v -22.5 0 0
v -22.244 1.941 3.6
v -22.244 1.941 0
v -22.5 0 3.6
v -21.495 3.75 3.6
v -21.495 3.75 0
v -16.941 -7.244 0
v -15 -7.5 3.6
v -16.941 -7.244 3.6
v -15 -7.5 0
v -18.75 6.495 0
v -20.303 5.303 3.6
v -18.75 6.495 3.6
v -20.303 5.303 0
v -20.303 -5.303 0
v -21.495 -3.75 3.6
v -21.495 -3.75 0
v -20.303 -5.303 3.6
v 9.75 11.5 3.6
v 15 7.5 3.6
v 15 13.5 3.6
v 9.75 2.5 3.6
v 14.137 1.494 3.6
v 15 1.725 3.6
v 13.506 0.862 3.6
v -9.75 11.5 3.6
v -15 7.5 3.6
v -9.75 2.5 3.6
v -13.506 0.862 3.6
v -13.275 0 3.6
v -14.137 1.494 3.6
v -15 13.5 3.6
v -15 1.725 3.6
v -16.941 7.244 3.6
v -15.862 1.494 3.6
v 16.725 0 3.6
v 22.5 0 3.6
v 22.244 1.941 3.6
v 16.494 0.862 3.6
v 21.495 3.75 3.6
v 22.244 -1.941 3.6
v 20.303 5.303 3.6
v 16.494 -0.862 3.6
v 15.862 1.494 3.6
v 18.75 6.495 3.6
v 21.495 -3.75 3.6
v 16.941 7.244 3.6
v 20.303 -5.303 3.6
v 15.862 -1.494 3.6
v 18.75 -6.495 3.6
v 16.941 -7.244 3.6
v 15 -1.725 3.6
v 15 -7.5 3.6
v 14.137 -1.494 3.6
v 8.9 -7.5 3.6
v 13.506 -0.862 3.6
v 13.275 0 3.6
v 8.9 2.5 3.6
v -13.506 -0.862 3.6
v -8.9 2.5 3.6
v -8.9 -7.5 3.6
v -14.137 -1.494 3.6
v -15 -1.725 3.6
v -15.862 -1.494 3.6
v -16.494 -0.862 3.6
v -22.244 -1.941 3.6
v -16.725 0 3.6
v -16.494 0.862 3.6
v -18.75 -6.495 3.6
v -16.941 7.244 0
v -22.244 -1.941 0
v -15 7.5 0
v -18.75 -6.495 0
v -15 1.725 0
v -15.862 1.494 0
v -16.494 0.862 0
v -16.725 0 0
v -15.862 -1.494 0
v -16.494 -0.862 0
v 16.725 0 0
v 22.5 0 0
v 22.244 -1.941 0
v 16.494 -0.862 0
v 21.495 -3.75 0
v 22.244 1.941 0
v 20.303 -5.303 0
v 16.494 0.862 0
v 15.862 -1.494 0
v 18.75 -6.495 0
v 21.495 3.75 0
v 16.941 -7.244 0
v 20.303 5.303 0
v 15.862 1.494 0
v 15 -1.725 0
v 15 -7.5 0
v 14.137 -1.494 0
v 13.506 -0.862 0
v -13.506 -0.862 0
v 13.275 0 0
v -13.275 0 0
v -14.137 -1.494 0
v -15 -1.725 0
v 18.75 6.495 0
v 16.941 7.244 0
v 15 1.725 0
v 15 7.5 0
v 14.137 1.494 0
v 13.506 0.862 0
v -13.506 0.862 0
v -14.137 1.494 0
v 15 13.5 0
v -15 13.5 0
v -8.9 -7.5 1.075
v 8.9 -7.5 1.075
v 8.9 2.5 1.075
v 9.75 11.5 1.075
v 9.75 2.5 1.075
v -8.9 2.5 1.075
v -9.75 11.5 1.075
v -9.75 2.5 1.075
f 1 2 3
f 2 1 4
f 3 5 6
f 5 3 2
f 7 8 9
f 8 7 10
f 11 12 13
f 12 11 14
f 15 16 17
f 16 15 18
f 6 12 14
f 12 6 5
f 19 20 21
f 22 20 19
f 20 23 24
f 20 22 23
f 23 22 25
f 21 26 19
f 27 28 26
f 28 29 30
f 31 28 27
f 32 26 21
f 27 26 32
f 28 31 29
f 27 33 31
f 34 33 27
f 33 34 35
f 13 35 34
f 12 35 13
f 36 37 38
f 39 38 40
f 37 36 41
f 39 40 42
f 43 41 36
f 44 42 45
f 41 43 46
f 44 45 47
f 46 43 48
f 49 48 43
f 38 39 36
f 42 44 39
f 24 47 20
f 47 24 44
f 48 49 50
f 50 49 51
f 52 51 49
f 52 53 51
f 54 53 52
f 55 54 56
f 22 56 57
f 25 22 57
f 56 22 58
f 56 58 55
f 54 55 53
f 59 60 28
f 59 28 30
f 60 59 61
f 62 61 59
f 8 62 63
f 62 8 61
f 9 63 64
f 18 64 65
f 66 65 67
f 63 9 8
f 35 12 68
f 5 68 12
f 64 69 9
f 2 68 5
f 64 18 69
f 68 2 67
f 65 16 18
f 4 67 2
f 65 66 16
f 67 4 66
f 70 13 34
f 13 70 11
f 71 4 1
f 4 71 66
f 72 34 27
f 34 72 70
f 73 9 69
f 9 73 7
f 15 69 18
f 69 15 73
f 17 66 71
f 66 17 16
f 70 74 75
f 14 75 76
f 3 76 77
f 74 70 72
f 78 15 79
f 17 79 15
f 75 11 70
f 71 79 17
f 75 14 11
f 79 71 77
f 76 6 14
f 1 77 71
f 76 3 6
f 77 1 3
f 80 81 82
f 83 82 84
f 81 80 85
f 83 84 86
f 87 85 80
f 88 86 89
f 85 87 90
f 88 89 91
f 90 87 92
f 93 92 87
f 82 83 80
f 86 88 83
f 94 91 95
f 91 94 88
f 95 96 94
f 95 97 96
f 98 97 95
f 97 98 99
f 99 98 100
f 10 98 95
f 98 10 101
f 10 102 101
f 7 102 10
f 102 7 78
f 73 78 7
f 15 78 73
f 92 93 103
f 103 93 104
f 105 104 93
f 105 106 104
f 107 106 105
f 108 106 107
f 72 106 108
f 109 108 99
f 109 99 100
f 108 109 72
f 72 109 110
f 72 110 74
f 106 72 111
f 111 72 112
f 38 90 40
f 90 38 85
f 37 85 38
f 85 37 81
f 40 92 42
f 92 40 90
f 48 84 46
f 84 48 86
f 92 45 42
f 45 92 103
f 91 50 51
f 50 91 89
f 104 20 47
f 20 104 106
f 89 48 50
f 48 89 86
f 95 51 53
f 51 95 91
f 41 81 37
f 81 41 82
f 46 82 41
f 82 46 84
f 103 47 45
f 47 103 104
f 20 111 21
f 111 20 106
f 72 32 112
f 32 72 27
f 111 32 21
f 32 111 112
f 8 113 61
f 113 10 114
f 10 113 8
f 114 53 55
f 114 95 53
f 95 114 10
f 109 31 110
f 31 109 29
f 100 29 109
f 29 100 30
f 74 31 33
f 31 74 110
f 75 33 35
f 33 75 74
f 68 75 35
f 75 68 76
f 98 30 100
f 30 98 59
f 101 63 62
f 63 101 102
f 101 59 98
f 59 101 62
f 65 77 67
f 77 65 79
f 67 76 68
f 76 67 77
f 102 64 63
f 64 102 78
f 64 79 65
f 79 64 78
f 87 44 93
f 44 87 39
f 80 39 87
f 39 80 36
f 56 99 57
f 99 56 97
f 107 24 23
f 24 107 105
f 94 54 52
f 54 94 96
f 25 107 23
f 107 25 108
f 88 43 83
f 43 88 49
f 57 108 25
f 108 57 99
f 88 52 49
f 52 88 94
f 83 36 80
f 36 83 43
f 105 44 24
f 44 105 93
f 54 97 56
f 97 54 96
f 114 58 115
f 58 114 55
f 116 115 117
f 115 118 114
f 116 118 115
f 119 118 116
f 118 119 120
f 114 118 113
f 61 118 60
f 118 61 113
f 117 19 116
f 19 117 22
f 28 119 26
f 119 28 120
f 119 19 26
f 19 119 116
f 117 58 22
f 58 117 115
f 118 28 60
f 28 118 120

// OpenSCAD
// file: configuration.scad
// Increase this if your slicer or printer make holes too tight.
extra_radius = 0.1;

// OD = outside diameter, corner to corner.
m3_nut_od = 6.1;
m3_nut_radius = m3_nut_od/2 + 0.2 + extra_radius;
m3_washer_radius = 3.5 + extra_radius;

// Major diameter of metric 3mm thread.
m3_major = 2.85;
m3_radius = m3_major/2 + extra_radius;
m3_wide_radius = m3_major/2 + extra_radius + 0.2;

// NEMA17 stepper motors.
motor_shaft_diameter = 5;
motor_shaft_radius = motor_shaft_diameter/2 + extra_radius;

// Frame brackets. M3x8mm screws work best with 3.6 mm brackets.
thickness = 3.6;

// OpenBeam or Misumi. Currently only 15x15 mm, but there is a plan
// to make models more parametric and allow 20x20 mm in the future.
extrusion = 15;

// Placement for the NEMA17 stepper motors.
motor_offset = 44;
motor_length = 47;
// main file
include <configuration.scad>;

radius = 7.5;

difference() {
  union() {
    for (x = [-2*radius, 2*radius]) {
      translate([x, 0, thickness/2])
        cylinder(r=radius, h=thickness, center=true, $fn=24);
    }
    translate([0, 3, thickness/2])
      cube([4*radius, 2*radius+6, thickness], center=true);
  }
  for (x = [-2*radius, 2*radius]) {
    translate([x, 0, 0]) #
      cylinder(r=m3_wide_radius, h=20, center=true, $fn=12);
  }
  translate([0, -5, 7.5]) #
    cube([17.6+2*extra_radius, 20, 12.85], center=true);
  translate([0, 7, 7.5]) #
    cube([19.3+2*extra_radius, 9, 12.85], center=true);
}
